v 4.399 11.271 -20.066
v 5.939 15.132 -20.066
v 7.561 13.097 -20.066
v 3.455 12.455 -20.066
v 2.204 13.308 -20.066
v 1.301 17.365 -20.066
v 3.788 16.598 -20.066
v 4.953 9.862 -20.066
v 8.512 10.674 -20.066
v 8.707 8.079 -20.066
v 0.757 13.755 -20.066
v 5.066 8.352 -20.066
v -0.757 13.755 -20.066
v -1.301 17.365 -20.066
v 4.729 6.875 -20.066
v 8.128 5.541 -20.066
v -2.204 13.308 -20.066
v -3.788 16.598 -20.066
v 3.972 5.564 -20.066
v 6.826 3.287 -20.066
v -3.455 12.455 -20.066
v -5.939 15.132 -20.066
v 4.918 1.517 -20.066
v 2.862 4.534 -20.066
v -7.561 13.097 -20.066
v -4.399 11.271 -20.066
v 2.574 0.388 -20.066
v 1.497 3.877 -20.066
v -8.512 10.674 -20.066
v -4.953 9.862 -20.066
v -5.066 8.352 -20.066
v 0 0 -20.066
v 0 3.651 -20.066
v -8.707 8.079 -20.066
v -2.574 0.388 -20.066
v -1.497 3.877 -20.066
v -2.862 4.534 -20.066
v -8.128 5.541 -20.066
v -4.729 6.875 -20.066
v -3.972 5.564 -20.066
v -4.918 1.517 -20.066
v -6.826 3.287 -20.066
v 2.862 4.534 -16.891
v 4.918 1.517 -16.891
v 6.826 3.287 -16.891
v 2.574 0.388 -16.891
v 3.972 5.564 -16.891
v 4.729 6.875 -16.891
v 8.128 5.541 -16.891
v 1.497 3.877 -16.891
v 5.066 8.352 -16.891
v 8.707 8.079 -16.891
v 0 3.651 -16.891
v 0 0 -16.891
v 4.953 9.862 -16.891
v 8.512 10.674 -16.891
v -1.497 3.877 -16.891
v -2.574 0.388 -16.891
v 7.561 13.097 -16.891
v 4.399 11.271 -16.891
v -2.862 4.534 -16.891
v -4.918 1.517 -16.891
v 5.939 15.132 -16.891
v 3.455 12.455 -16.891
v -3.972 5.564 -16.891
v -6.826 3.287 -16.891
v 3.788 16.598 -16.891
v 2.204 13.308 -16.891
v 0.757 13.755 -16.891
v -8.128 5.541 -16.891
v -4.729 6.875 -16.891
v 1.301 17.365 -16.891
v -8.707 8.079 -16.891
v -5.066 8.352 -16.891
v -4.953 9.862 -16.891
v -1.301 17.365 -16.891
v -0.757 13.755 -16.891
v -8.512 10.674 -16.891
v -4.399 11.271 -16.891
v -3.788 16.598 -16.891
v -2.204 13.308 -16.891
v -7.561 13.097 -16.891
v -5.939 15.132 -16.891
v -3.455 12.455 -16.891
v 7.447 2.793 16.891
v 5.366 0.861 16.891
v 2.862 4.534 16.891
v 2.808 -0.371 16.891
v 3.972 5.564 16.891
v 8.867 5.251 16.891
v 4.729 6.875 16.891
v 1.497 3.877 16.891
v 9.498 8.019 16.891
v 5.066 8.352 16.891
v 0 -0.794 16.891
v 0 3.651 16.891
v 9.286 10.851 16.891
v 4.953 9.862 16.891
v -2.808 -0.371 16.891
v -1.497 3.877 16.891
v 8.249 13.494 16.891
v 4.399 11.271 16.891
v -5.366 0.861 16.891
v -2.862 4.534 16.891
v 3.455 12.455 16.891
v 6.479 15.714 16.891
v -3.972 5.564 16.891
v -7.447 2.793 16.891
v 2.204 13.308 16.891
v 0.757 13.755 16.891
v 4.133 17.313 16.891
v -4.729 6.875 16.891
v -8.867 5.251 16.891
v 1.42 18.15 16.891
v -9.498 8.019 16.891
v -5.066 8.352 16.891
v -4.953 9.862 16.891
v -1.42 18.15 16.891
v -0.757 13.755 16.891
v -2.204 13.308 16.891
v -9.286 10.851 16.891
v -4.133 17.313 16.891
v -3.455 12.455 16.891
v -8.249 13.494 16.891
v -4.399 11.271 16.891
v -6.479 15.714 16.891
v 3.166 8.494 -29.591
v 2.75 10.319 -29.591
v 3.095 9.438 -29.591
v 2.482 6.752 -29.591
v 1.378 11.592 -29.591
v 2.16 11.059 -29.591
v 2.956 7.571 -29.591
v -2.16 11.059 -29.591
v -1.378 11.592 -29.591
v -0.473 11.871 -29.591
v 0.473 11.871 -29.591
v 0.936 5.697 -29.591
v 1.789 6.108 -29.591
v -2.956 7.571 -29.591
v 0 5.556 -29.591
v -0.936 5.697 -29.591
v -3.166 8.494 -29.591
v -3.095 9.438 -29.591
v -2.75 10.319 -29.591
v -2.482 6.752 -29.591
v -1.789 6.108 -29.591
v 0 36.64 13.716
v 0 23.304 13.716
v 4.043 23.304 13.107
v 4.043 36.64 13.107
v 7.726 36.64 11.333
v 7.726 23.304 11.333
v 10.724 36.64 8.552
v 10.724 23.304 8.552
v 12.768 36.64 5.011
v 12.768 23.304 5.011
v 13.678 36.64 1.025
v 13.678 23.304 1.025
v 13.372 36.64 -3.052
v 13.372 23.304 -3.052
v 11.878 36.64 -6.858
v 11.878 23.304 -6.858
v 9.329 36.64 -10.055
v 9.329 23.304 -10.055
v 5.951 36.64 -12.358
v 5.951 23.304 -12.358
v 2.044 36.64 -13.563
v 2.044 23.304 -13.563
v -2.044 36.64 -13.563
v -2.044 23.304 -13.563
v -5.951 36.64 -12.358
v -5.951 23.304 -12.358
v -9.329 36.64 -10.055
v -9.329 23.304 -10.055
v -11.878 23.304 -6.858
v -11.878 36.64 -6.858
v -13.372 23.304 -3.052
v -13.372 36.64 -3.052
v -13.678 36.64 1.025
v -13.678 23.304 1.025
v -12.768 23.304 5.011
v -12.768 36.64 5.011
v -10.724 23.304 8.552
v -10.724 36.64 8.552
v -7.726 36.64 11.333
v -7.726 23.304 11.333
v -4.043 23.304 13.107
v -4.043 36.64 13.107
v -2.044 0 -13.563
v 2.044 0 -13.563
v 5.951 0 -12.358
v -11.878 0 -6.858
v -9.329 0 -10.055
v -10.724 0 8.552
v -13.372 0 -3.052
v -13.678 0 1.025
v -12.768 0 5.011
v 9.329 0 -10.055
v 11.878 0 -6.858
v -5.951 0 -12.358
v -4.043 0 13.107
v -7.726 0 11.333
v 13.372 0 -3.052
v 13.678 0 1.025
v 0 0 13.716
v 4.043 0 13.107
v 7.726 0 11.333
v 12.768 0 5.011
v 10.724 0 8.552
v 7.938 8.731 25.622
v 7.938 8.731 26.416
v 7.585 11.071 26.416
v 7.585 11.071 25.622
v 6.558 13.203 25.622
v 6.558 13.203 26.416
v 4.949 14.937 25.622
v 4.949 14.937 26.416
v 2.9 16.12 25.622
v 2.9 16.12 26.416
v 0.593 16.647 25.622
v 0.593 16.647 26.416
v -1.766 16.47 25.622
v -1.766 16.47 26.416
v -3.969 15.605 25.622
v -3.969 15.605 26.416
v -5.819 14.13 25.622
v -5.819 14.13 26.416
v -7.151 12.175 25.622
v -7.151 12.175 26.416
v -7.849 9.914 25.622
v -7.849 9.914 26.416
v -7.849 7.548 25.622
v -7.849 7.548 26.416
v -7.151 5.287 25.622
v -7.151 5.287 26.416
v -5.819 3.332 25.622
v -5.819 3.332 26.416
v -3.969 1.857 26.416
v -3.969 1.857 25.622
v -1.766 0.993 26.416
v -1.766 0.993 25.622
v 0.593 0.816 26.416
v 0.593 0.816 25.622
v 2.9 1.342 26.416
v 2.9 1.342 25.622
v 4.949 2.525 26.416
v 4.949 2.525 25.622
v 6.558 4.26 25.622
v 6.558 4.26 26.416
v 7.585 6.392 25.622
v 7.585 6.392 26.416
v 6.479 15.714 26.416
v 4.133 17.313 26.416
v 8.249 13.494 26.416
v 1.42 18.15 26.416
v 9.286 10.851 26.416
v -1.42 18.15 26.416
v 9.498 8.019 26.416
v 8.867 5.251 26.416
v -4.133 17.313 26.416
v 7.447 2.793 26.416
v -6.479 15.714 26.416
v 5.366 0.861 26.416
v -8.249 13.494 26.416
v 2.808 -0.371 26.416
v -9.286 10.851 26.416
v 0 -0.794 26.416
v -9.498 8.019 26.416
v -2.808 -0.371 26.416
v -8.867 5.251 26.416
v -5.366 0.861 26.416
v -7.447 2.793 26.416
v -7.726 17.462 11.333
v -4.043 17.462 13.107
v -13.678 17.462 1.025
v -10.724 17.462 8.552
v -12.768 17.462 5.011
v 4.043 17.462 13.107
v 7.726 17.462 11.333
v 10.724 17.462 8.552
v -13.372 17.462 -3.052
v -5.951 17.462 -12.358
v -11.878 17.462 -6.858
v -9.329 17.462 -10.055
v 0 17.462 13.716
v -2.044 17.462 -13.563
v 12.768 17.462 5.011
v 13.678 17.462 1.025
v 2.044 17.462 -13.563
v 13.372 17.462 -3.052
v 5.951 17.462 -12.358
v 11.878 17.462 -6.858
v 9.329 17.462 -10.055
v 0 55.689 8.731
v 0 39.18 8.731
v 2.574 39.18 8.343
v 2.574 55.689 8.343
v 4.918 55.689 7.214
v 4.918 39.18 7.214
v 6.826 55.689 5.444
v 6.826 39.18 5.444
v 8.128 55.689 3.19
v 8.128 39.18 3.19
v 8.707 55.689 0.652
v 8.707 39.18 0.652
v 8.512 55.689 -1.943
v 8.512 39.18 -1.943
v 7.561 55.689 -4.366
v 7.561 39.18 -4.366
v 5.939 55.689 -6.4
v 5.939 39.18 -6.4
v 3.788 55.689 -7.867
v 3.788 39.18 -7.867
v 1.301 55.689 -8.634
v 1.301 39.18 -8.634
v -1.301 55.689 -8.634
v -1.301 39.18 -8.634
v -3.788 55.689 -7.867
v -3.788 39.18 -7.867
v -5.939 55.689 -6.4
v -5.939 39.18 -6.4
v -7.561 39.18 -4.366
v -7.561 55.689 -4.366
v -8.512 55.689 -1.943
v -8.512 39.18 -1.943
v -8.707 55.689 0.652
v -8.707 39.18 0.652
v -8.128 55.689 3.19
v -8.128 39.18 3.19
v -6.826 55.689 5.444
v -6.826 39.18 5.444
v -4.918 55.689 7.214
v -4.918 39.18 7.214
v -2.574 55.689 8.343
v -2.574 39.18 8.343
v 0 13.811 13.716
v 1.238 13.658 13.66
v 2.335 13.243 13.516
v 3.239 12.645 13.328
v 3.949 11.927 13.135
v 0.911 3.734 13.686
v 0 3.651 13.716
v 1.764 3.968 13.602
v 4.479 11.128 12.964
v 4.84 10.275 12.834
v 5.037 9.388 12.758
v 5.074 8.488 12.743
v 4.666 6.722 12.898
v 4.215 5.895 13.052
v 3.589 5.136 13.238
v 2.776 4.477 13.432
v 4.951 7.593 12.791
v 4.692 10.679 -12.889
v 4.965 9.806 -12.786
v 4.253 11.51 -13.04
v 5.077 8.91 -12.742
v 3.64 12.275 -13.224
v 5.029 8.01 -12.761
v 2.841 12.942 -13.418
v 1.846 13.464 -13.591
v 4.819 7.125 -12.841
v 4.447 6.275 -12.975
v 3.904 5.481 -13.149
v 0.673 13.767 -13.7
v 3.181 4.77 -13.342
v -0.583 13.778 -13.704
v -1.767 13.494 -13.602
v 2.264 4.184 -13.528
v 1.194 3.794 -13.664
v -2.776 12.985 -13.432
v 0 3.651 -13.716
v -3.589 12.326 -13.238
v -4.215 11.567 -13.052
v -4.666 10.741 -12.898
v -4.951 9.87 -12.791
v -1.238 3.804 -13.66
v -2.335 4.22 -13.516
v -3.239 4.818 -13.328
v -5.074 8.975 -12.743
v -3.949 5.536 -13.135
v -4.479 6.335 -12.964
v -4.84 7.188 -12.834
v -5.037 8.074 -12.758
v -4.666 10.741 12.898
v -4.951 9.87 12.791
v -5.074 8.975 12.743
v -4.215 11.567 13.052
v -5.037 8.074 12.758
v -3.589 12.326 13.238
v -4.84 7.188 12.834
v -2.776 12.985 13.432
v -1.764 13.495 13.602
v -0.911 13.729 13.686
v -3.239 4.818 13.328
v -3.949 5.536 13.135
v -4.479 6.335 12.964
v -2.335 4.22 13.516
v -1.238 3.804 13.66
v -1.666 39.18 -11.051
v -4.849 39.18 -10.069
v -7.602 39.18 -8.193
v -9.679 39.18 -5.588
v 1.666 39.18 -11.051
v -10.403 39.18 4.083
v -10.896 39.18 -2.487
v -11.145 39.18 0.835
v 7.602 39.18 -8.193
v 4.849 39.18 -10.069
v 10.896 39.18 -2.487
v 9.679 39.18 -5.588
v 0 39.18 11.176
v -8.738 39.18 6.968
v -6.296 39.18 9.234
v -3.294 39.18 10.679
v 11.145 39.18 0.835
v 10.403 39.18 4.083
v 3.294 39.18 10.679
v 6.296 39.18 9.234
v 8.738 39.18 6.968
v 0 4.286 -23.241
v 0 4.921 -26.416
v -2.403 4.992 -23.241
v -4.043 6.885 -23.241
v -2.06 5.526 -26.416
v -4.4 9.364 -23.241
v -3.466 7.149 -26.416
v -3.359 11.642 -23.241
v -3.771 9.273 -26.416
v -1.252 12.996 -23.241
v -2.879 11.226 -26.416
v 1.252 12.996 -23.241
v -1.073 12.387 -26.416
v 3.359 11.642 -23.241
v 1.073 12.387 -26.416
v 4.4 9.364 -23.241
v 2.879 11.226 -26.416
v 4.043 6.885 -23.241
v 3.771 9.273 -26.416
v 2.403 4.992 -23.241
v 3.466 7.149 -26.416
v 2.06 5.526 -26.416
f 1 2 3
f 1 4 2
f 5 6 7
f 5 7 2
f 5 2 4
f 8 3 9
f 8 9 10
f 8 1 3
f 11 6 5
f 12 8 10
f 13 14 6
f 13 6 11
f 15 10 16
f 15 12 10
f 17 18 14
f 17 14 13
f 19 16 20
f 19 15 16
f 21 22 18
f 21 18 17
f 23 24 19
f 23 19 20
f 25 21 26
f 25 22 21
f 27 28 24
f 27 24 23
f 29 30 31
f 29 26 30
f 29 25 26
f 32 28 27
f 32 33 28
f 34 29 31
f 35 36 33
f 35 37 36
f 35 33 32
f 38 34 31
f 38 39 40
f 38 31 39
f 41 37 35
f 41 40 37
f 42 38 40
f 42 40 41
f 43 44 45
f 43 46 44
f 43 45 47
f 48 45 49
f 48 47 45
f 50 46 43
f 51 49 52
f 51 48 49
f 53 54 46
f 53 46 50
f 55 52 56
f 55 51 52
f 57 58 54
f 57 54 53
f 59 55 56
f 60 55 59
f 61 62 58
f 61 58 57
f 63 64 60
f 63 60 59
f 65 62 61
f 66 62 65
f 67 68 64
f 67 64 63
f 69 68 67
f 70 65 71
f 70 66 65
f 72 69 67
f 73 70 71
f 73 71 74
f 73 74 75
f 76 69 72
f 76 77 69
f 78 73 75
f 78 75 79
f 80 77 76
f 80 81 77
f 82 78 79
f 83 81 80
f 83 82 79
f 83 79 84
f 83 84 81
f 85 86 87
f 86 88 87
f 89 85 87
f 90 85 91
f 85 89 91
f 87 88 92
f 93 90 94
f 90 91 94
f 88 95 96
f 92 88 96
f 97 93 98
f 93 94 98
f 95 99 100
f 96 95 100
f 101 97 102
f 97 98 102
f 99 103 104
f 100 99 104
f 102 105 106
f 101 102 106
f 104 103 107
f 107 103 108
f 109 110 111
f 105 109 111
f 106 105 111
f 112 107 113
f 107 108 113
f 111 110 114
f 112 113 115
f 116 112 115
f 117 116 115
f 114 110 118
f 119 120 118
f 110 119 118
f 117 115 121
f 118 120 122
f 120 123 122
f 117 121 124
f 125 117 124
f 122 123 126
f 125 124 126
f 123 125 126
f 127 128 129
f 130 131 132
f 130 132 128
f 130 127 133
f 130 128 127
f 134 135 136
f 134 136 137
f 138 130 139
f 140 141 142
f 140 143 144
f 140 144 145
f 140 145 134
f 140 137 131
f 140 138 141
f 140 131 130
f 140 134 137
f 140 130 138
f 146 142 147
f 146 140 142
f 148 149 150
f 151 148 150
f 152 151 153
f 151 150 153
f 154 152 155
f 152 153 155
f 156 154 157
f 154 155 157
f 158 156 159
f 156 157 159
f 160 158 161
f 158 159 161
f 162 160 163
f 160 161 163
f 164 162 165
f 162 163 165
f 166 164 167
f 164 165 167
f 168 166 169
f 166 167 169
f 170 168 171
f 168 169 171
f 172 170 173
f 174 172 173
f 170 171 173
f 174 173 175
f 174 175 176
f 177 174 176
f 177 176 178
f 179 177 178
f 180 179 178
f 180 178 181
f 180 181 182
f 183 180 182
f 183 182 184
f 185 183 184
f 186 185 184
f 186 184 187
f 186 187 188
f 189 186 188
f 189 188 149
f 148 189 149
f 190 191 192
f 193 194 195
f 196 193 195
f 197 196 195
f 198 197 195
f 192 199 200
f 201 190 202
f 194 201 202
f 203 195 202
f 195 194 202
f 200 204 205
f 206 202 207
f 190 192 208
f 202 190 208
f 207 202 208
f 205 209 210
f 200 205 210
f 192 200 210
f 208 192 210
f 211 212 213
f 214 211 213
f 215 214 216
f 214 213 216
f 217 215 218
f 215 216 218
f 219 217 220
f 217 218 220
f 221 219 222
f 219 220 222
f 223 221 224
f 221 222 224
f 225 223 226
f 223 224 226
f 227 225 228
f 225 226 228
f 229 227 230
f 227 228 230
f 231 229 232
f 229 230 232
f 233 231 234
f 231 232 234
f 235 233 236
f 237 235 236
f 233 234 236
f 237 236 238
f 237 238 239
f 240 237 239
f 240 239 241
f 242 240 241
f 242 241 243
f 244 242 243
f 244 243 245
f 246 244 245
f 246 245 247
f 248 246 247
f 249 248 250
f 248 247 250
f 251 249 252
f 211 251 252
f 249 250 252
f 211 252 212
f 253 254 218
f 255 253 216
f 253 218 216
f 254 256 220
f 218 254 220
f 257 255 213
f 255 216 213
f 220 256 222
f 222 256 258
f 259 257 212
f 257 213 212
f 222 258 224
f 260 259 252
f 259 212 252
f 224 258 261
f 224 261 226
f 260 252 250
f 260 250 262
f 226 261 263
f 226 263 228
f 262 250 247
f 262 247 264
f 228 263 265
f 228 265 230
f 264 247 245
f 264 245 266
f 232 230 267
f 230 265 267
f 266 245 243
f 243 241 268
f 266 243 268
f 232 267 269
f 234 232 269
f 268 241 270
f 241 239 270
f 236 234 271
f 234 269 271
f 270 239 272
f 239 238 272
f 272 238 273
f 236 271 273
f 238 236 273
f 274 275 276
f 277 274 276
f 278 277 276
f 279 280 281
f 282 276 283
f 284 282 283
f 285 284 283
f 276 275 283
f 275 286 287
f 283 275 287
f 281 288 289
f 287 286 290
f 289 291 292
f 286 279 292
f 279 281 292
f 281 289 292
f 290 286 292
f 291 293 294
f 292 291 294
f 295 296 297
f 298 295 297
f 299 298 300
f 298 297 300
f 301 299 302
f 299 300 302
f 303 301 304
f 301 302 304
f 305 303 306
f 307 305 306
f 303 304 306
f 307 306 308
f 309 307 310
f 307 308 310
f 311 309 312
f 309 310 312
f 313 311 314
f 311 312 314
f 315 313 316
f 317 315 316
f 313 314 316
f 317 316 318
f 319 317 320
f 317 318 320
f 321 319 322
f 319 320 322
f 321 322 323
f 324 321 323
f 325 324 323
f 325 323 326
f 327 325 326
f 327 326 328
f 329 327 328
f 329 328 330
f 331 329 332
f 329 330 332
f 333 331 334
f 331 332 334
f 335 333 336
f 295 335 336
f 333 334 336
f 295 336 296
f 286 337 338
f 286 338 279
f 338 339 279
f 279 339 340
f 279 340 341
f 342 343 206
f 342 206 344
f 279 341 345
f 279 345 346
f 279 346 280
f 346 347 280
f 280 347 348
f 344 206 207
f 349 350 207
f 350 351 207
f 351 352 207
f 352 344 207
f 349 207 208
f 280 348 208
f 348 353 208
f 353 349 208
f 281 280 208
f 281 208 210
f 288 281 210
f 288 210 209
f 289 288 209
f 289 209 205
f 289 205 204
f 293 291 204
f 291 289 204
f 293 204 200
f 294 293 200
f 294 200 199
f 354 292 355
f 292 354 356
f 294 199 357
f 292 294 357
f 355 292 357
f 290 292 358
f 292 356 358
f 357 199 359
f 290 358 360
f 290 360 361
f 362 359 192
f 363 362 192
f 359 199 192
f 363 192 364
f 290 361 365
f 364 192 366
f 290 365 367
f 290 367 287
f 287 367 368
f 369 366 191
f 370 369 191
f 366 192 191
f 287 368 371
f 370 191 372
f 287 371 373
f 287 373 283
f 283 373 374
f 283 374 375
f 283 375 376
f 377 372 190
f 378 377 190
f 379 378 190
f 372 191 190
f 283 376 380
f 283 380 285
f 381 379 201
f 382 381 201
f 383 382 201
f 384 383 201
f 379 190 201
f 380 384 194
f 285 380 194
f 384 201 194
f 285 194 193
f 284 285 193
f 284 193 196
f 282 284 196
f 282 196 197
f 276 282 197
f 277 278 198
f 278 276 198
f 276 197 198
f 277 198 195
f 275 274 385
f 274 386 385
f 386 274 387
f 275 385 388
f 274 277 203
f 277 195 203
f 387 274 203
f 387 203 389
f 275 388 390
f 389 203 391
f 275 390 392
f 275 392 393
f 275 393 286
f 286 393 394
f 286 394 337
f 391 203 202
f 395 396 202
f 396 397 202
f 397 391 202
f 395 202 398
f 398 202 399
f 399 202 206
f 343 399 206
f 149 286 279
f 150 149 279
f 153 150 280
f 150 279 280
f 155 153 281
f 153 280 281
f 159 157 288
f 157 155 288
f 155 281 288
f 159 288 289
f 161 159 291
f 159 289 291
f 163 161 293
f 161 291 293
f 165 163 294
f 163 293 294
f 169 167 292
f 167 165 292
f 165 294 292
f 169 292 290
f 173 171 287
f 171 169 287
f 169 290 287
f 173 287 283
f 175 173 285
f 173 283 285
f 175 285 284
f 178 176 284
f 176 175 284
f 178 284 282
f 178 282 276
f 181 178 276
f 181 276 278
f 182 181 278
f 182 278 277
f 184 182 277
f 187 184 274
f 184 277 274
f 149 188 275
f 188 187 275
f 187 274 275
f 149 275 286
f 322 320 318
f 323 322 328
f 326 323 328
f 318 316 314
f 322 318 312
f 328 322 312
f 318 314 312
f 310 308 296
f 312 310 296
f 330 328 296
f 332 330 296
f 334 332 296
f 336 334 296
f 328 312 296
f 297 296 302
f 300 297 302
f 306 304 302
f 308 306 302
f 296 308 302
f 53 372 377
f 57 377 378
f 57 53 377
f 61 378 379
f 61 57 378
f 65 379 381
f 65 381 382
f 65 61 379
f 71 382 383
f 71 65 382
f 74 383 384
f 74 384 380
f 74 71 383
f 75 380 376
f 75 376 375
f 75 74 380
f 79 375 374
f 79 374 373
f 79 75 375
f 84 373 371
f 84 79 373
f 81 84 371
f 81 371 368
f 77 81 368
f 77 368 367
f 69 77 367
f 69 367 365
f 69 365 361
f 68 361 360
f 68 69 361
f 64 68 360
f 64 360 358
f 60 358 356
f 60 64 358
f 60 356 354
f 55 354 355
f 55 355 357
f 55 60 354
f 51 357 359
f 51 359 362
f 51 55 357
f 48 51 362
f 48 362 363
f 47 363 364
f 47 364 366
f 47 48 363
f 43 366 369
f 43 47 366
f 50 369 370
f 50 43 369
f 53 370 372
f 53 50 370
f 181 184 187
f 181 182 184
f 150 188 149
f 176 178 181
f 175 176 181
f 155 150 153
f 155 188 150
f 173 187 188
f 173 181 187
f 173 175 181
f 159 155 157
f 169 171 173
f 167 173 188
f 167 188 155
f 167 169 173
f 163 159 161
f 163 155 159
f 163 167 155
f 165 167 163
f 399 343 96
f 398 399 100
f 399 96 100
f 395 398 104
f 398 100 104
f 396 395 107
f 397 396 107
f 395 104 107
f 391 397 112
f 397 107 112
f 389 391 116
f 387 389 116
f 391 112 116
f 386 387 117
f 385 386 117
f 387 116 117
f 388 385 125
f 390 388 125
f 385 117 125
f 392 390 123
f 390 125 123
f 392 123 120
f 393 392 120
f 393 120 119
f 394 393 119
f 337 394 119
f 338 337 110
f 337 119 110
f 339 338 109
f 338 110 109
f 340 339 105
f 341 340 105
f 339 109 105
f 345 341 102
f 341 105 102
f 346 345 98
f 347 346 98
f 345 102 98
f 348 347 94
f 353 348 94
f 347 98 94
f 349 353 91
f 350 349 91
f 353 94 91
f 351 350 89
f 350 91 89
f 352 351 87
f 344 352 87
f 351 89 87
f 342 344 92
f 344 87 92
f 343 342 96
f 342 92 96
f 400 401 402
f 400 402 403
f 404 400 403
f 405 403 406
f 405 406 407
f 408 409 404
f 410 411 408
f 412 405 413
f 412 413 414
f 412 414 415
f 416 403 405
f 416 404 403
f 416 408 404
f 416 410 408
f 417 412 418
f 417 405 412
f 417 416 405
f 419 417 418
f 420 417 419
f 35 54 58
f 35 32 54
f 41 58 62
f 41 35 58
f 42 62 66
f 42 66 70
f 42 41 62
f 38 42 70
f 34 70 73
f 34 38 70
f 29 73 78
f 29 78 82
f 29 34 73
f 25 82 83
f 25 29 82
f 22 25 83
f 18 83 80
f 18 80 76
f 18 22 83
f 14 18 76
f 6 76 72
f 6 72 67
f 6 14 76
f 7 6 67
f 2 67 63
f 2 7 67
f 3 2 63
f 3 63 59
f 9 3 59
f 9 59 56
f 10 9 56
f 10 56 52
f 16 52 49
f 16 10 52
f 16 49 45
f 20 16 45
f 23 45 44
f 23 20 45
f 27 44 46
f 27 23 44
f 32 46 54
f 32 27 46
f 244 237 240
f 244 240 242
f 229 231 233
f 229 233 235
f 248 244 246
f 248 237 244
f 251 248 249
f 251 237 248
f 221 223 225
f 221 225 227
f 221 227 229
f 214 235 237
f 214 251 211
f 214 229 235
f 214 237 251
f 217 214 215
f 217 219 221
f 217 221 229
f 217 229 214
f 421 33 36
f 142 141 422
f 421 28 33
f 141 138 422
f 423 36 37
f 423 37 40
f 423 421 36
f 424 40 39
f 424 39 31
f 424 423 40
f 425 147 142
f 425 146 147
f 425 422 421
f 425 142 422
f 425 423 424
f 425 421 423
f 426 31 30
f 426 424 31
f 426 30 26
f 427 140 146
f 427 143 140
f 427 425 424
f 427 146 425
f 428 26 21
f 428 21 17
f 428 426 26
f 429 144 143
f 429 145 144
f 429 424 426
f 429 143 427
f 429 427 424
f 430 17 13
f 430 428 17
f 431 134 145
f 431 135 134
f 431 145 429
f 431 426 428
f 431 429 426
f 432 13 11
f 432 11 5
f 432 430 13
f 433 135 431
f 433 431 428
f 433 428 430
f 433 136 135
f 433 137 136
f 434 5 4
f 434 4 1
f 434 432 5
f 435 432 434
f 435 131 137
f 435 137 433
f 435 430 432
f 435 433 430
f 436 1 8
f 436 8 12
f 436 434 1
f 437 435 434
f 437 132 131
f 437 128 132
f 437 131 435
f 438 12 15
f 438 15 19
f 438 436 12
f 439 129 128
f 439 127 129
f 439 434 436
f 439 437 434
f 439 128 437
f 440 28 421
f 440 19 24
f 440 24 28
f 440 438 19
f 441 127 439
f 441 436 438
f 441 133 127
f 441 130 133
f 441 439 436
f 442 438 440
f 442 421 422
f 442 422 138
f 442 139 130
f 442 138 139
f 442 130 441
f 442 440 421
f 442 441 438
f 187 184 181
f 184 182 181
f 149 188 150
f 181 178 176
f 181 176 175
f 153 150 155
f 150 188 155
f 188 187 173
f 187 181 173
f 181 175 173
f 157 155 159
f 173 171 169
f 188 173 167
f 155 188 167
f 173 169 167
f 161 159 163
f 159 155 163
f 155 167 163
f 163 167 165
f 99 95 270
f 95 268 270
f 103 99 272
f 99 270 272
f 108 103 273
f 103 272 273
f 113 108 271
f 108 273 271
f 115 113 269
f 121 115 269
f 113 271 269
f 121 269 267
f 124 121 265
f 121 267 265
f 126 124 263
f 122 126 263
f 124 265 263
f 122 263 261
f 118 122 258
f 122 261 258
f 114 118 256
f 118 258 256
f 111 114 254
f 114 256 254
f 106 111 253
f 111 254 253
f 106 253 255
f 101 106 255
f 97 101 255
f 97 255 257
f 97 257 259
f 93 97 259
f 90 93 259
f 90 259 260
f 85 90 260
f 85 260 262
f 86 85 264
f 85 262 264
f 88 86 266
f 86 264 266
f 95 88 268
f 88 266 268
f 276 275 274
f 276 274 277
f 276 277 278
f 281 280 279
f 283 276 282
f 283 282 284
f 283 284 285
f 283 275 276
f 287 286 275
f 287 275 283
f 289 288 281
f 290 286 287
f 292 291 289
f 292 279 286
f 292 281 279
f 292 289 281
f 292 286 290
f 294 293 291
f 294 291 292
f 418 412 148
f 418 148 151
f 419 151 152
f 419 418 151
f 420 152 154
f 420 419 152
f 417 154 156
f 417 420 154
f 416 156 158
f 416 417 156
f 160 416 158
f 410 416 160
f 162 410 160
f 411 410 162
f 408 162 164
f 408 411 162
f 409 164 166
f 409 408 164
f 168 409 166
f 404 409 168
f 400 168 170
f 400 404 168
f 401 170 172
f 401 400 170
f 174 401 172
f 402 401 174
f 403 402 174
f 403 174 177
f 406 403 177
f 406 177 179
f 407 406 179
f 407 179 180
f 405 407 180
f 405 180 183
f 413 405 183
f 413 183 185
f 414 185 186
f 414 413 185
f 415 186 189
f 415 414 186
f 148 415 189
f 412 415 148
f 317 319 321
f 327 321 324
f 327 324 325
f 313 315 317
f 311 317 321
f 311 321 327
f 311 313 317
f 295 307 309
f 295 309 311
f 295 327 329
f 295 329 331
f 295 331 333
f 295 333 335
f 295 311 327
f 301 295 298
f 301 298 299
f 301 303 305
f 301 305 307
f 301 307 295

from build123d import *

# Parameters (mm, degrees)
SKETCH1_R           = 13.716
BOSS_EXTRUDE1_DEPTH = 39.1795
CHAMFER1_SIZE       = 2.54
SKETCH3_R           = 8.73125
BOSS_EXTRUDE3_DEPTH = 16.51
SKETCH5_R           = 7.9375
CUT_EXTRUDE1_DEPTH  = 0.79375


# Read off the part's stored shape, not the designer's step: Split3
with BuildPart() as part:
    # Sketch1 → Boss-Extrude1 (new body)
    with BuildSketch(Plane(origin=(0, 0, 0), x_dir=(1, 0, 0), z_dir=(0, 1, 0))):
        with Locations(Location((0, 0, 0), (0, 0, 270))):
            Circle(SKETCH1_R)
    extrude(amount=BOSS_EXTRUDE1_DEPTH)


with BuildPart() as body_2:
    # Split1: the piece on the far side of the plane
    add(part.part)
    split(bisect_by=Plane(origin=(0, 17.4625, 0), x_dir=(0, 0, -1), z_dir=(0, -1, 0)), keep=Keep.BOTTOM)

    # Chamfer1
    chamfer1_edges = [body_2.edges().sort_by_distance(p)[0] for p in [
        (0, 39.1795, -13.716),
    ]]
    chamfer(chamfer1_edges, length=CHAMFER1_SIZE)


with BuildPart() as part_1:
    add(part.part)

    # Split1
    split(bisect_by=Plane(origin=(0, 17.4625, 0), x_dir=(0, 0, -1), z_dir=(0, -1, 0)), keep=Keep.TOP)

    # Sketch4 → Revolve1 (revolve)
    with BuildSketch(Plane(origin=(0, 0, 0), x_dir=(0, 0, -1), z_dir=(1, 0, 0)), mode=Mode.PRIVATE) as revolve1_sk:
        Polygon((-6.858, 8.73125), (-6.858, 13.81125), (-16.891, 13.81125), (-16.891, 18.25625), (-26.416, 18.25625), (-26.416, 8.73125), align=None)
        Polygon((6.858, 8.73125), (6.858, 13.81125), (16.891, 13.81125), (16.891, 17.4625), (20.066, 17.4625), (20.066, 13.81125), (29.591, 11.90625), (29.591, 8.73125), align=None)
    revolve(revolve1_sk.sketch.rotate(Axis((0, 8.73125, 26.416), (0, 0, -1)), 180), axis=Axis((0, 8.73125, 26.416), (0, 0, -1)))

    # Sketch5 → Cut-Extrude1 (cut)
    with BuildSketch(Plane.XY.offset(26.416)):
        with Locations((0, 8.73125)):
            Circle(SKETCH5_R)
    extrude(amount=-CUT_EXTRUDE1_DEPTH, mode=Mode.SUBTRACT)


with BuildPart() as body_3:
    # Sketch3 → Boss-Extrude3 (new body)
    with BuildSketch(Plane(origin=(0, 39.1795, 0), x_dir=(1, 0, 0), z_dir=(0, 1, 0))):
        with Locations(Location((0, 0, 0), (0, 0, 270))):
            Circle(SKETCH3_R)
    extrude(amount=BOSS_EXTRUDE3_DEPTH)


with BuildPart() as body_4:
    # Split3: the piece on the far side of the plane
    add(body_2.part)
    split(bisect_by=Plane(origin=(0, 23.3045, 0), x_dir=(1, 0, 0), z_dir=(0, 1, 0)), keep=Keep.BOTTOM)


with BuildPart() as body_2_1:
    add(body_2.part)

    # Split3
    split(bisect_by=Plane(origin=(0, 23.3045, 0), x_dir=(1, 0, 0), z_dir=(0, 1, 0)), keep=Keep.TOP)


solid = Compound([part_1.part, body_3.part, body_4.part, body_2_1.part])
